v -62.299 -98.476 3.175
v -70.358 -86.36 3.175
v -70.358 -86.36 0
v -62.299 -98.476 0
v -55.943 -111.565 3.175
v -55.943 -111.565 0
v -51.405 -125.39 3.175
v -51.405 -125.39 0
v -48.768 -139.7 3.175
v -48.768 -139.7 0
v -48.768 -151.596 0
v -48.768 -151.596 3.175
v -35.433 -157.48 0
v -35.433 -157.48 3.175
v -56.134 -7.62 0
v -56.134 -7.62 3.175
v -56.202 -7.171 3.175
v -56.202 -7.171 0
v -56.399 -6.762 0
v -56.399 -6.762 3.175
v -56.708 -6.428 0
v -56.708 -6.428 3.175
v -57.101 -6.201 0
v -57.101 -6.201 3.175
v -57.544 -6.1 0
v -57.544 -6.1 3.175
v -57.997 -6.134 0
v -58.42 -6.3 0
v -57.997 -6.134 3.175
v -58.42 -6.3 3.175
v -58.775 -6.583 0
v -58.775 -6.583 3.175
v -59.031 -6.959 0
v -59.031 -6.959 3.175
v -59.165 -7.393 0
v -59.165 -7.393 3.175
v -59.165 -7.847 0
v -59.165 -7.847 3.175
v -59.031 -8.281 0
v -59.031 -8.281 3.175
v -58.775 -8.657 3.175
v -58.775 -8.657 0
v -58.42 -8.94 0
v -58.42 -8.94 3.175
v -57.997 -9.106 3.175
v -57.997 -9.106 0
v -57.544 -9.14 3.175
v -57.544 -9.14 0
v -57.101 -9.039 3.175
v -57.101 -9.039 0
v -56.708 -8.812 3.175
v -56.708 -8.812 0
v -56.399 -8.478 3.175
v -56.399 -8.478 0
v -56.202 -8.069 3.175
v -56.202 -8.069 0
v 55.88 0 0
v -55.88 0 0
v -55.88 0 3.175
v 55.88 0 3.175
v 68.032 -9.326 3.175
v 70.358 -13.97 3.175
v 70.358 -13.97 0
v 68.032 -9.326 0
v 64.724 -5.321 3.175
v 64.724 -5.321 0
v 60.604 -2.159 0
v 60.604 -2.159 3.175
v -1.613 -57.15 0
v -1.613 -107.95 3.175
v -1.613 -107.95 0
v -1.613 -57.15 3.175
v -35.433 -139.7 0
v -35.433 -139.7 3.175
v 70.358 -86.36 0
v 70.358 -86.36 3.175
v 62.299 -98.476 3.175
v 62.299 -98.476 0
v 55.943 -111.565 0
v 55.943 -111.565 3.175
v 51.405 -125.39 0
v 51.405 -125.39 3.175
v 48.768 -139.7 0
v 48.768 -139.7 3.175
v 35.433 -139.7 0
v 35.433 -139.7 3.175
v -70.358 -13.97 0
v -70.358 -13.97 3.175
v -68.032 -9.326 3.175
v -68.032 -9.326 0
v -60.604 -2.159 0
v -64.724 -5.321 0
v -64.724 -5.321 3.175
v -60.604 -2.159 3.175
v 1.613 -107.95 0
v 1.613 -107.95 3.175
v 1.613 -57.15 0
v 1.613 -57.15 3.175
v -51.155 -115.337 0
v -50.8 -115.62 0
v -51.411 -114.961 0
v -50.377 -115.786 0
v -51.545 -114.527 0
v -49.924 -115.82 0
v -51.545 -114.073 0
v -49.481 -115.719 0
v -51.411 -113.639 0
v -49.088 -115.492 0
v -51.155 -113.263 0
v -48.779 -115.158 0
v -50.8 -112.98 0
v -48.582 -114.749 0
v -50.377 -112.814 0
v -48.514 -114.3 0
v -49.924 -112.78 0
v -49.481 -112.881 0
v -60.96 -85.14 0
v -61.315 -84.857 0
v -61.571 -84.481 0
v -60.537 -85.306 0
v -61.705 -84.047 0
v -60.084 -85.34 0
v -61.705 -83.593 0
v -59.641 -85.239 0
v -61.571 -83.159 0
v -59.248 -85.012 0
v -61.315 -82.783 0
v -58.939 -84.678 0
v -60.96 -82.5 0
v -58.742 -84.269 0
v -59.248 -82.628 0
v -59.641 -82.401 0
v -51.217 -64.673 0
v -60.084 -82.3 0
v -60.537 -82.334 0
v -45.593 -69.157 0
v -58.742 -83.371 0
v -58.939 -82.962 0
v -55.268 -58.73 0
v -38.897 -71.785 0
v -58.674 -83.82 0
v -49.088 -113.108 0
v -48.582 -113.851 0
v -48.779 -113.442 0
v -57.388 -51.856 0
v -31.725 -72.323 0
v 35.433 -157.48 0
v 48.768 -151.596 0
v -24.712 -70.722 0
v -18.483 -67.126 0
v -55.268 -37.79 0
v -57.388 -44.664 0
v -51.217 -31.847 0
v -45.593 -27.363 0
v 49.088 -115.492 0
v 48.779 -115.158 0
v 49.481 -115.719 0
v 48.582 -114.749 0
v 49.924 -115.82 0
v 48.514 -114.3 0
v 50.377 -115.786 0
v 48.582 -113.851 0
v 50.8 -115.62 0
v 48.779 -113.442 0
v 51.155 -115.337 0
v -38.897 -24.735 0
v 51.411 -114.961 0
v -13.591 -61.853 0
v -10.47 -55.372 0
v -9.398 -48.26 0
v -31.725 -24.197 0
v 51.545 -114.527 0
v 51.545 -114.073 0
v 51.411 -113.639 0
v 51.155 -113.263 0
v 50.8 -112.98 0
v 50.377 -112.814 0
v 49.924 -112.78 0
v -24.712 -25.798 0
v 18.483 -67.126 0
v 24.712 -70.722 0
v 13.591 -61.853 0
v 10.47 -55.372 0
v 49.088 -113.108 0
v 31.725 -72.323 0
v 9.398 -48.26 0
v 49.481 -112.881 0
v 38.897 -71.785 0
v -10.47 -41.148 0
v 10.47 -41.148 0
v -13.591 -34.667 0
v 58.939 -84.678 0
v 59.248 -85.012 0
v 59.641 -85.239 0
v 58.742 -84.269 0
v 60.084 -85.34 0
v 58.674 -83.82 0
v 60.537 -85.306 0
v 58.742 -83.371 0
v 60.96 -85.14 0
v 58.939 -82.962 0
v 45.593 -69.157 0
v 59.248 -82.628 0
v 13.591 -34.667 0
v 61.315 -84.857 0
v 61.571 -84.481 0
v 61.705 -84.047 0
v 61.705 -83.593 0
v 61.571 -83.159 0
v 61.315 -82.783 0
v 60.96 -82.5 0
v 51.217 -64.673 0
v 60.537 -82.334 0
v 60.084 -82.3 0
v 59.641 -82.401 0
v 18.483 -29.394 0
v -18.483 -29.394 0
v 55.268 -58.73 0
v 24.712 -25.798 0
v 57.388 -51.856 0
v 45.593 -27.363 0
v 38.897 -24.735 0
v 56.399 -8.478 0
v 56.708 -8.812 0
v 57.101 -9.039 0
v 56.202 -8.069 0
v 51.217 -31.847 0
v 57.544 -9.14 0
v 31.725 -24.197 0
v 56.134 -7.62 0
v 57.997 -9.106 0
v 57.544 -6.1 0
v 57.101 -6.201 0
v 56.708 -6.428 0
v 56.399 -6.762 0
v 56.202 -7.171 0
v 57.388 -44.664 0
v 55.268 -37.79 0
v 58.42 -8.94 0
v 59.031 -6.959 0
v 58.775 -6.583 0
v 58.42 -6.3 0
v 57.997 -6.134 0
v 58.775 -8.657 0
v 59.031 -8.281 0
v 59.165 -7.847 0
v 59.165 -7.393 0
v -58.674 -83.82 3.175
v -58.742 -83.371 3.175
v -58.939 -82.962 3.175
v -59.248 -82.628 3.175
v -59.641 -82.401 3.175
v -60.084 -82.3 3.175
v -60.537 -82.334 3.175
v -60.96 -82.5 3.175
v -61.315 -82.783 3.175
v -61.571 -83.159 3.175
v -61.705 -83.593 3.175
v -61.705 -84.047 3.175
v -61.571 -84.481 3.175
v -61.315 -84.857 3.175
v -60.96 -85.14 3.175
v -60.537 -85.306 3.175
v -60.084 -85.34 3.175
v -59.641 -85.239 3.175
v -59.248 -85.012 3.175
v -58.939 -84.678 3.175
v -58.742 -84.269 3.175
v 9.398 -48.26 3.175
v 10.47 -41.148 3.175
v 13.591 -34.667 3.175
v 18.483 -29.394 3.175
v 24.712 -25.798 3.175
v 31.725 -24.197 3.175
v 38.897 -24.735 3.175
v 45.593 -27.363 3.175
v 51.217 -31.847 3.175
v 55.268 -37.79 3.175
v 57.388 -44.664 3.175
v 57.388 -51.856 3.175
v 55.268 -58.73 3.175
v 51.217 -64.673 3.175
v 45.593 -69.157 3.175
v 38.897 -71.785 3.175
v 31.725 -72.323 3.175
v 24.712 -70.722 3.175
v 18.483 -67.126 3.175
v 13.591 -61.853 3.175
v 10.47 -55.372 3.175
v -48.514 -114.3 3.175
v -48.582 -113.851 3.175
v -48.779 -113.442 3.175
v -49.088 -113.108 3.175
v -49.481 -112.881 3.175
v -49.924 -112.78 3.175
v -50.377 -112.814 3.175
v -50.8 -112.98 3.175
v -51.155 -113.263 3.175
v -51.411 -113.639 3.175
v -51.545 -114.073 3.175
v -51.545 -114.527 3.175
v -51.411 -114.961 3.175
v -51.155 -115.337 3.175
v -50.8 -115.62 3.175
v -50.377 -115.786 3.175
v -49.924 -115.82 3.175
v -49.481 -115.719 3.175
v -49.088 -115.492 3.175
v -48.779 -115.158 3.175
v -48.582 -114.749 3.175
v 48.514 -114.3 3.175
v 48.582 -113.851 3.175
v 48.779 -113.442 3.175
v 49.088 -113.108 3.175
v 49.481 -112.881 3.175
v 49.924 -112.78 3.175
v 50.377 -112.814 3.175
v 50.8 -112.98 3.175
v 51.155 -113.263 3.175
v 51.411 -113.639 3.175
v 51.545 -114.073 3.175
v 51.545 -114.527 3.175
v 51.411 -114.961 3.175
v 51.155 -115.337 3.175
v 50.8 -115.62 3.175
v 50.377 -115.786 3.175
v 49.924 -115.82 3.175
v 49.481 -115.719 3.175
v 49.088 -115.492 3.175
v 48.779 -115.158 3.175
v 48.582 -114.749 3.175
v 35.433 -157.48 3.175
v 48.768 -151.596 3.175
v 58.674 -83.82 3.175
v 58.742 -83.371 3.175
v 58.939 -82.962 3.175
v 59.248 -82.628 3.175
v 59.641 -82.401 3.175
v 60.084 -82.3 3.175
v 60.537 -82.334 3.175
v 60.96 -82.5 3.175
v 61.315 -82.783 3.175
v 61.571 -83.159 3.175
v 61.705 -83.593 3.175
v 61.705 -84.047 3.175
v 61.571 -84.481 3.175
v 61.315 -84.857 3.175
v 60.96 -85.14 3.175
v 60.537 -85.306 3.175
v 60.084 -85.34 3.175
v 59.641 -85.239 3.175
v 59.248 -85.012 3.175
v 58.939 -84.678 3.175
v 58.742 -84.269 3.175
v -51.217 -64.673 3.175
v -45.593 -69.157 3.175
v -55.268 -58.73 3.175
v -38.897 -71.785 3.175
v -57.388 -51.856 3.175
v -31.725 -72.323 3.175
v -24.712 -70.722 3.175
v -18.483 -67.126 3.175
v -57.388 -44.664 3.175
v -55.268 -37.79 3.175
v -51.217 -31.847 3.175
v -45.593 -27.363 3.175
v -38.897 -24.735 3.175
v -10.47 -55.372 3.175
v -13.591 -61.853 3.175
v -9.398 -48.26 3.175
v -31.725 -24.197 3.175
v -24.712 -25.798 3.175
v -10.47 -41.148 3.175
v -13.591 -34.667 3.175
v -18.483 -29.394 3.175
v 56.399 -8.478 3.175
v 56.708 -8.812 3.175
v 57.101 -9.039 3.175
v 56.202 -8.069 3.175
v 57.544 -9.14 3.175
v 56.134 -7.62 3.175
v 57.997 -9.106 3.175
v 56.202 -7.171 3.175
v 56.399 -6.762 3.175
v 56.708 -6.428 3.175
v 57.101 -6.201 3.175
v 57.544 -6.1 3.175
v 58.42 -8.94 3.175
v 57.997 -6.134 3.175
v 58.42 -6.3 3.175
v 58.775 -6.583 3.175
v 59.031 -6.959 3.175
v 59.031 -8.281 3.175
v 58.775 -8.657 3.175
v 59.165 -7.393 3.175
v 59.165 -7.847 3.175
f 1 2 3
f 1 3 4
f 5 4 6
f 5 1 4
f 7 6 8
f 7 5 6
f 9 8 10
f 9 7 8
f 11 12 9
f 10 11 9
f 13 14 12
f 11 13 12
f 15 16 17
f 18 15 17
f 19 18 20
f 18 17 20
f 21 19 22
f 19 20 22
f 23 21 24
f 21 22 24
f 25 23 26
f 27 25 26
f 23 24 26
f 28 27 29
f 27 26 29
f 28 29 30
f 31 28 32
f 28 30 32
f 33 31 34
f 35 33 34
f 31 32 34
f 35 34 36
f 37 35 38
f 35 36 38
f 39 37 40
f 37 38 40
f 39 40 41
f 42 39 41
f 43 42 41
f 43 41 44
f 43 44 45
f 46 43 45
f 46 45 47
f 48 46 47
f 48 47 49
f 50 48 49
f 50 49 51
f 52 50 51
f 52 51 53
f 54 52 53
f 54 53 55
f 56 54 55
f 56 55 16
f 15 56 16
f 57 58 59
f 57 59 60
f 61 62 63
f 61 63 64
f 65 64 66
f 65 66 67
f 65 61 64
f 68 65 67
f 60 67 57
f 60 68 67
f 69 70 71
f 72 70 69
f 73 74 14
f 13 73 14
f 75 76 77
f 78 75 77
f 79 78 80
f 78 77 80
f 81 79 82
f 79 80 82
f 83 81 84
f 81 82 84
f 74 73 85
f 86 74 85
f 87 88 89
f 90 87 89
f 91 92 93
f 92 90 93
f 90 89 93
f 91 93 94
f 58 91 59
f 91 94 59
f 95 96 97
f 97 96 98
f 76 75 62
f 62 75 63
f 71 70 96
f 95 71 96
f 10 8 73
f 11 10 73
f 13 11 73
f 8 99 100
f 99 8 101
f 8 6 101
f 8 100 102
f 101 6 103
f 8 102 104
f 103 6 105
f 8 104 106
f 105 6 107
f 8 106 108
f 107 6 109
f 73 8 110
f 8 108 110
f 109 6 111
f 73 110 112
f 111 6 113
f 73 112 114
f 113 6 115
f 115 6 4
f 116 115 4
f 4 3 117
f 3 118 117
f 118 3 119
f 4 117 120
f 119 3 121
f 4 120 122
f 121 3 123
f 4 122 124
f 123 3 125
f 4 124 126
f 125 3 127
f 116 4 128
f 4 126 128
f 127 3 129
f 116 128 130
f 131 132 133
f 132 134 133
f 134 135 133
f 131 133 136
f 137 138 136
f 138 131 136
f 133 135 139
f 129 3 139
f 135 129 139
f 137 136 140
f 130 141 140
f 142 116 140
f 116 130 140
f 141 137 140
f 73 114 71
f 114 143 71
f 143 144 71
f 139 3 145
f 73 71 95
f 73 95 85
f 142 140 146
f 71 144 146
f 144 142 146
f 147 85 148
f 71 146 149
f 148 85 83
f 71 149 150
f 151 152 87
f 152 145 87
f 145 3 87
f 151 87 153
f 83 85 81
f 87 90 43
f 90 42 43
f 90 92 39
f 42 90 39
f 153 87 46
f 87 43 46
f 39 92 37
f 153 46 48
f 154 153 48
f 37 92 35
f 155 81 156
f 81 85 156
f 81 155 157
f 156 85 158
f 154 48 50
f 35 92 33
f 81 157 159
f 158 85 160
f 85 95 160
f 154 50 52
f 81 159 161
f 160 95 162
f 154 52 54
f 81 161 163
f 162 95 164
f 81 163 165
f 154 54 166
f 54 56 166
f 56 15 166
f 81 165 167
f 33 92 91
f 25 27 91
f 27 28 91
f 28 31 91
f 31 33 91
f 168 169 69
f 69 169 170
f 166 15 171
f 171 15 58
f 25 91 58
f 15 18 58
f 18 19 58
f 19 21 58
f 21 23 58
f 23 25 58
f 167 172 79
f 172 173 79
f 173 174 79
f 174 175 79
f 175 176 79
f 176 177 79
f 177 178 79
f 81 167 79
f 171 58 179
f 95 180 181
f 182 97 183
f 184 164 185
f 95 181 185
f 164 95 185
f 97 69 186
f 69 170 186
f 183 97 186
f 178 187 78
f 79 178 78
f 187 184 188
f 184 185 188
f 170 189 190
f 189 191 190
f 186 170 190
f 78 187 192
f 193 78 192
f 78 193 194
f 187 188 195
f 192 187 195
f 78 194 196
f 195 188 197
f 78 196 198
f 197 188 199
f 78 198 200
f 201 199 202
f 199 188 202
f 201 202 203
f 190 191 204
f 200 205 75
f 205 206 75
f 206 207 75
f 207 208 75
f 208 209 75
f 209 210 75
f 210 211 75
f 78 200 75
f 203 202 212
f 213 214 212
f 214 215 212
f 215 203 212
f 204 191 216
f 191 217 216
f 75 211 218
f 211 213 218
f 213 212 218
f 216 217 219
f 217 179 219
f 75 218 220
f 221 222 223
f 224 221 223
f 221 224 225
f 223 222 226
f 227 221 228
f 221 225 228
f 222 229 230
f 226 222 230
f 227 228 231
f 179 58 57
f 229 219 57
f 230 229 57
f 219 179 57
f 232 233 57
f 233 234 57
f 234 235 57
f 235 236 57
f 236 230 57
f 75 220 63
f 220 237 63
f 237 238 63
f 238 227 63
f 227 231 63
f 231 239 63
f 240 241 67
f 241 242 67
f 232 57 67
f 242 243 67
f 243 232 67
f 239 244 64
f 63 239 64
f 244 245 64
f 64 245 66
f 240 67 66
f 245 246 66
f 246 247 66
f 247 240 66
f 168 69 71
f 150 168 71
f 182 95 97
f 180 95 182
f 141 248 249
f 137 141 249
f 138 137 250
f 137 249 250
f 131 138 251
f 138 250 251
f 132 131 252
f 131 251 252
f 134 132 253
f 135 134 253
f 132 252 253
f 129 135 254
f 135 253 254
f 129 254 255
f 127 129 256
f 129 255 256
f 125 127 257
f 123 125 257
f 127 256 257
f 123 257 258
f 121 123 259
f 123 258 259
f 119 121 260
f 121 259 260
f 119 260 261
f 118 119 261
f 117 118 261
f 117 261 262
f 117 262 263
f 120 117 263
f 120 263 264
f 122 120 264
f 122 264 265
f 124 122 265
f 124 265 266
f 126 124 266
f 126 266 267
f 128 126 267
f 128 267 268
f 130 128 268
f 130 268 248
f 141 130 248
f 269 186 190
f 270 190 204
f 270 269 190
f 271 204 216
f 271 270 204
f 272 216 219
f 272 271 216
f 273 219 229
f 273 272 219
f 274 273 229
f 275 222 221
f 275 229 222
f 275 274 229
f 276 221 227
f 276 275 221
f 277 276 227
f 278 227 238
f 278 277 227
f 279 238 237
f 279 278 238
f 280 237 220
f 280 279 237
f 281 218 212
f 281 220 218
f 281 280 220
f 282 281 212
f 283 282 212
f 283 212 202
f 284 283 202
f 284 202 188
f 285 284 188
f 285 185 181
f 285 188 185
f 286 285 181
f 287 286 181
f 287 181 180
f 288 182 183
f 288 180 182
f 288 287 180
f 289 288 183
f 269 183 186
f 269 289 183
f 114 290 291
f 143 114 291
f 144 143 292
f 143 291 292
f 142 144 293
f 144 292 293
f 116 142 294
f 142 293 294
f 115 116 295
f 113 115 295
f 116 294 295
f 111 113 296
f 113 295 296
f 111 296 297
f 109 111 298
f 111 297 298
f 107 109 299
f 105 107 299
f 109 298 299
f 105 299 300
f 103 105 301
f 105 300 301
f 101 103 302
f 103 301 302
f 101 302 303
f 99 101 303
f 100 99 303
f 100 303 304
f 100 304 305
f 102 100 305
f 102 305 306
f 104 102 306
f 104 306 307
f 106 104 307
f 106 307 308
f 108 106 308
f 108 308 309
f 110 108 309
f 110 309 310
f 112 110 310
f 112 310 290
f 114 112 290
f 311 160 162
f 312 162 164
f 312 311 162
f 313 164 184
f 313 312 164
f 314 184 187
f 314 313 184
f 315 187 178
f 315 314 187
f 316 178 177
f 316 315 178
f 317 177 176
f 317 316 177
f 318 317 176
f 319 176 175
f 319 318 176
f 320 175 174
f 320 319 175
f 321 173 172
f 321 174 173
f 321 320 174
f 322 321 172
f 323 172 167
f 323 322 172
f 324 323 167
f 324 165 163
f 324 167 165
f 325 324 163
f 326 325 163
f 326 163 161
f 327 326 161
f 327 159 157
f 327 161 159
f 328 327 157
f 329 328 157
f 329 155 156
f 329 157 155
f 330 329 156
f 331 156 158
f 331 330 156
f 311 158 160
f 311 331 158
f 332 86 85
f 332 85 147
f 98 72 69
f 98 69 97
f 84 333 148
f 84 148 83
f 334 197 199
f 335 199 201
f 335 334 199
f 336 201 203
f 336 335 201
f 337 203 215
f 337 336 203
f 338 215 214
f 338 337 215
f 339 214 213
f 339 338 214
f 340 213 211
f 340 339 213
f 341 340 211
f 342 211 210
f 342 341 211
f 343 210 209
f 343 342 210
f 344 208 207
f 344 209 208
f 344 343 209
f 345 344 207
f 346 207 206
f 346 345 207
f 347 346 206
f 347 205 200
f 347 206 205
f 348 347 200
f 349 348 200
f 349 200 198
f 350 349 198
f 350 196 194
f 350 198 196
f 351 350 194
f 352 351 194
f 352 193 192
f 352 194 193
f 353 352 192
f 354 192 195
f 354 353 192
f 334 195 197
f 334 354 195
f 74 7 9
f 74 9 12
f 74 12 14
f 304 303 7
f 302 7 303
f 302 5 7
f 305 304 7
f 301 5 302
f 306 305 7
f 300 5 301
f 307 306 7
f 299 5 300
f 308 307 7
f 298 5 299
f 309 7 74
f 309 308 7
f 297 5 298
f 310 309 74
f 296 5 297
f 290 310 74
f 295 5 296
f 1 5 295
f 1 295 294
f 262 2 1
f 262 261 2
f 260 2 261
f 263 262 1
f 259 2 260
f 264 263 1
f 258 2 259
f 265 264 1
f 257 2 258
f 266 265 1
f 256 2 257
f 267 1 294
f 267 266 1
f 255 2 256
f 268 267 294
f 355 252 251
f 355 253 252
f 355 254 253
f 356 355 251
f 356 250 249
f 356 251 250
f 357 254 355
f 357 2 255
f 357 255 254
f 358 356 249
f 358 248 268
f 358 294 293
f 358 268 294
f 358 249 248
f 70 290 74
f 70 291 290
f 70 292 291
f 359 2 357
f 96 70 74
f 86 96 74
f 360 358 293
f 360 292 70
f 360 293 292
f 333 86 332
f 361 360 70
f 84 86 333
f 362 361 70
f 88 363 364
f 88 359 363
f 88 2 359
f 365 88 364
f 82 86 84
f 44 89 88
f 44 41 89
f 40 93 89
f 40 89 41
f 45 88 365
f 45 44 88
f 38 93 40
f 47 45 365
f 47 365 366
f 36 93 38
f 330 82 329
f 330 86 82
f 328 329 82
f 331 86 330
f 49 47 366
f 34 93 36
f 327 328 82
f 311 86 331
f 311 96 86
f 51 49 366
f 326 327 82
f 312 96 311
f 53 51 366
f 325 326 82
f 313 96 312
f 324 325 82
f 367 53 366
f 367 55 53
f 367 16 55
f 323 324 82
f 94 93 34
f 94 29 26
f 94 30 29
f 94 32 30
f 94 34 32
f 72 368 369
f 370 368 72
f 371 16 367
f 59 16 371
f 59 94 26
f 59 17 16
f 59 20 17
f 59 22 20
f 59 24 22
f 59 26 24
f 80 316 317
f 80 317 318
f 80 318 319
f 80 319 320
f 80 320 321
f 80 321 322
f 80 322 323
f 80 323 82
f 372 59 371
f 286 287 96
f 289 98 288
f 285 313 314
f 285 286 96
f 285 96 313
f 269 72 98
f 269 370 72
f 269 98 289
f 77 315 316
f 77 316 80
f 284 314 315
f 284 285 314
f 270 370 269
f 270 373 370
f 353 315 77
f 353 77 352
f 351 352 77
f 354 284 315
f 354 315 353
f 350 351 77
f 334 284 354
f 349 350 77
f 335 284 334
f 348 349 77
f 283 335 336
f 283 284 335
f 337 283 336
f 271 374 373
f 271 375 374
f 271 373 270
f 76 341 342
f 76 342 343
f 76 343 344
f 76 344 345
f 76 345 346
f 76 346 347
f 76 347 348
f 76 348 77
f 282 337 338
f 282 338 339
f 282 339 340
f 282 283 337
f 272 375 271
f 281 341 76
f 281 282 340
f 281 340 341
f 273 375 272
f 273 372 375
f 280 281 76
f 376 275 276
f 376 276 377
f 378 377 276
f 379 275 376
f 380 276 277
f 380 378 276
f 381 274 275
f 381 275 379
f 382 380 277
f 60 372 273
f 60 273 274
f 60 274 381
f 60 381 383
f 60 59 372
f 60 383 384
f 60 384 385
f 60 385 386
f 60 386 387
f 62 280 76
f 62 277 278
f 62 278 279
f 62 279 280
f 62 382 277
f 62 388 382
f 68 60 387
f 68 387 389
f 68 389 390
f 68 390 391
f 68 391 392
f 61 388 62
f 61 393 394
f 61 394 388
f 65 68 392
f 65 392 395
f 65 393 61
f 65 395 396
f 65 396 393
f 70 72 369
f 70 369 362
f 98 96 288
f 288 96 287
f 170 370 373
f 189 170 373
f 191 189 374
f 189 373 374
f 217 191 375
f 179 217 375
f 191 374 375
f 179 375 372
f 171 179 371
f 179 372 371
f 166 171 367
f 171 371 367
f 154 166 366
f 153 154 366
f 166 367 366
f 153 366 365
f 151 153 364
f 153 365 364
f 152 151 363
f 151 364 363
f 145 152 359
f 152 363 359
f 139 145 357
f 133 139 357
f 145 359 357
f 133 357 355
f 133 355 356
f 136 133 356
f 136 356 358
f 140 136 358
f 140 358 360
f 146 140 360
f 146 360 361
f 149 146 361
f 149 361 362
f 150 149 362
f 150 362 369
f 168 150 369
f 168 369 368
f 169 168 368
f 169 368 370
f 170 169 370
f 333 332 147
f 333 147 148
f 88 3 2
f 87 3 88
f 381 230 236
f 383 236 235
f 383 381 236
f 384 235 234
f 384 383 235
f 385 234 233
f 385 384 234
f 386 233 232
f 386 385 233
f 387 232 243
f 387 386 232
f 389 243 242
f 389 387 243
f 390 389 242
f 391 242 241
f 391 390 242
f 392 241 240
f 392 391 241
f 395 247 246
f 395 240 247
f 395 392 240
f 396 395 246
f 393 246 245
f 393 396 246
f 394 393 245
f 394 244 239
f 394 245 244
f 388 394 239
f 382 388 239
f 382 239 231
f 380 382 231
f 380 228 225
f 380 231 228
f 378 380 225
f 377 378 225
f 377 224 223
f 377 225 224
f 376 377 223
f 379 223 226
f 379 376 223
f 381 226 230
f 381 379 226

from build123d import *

# Parameters (mm, degrees)
SKETCH1_W                           = 140.716
SKETCH1_H                           = 139.7
MAIN_BODY_DEPTH                     = 3.175
SKETCH2_R                           = 24.13
CUTS_FOR_EYES_AND_MOTORS_DEPTH      = 4.175
SKETCH4_W                           = 3.2258
SKETCH4_H                           = 50.8
CUT_FOR_NOSE_DEPTH                  = 4.175
CUT_FOR_ROUNDED_FACE_FEATURES_DEPTH = 4.175
SKETCH12_R                          = 1.524
HOLES_FOR_SPACERS_DEPTH             = 4.175
BOSS_EXTRUDE1_DEPTH                 = 3.175


with BuildPart() as part:
    # Sketch1 → main body (new body)
    with BuildSketch(Plane.XY):
        with Locations((0, -69.85)):
            Rectangle(SKETCH1_W, SKETCH1_H)
    extrude(amount=MAIN_BODY_DEPTH)

    # Sketch2 → cuts for eyes and motors (cut, through all)
    with BuildSketch(Plane.XY.offset(3.175)):
        with Locations((-33.528, -48.26)):
            Circle(SKETCH2_R)
    cuts_for_eyes_and_motors = extrude(amount=-CUTS_FOR_EYES_AND_MOTORS_DEPTH, mode=Mode.SUBTRACT)

    # Sketch4 → cut for nose (cut, through all)
    with BuildSketch(Plane.XY.offset(3.175)):
        with Locations((0, -82.55)):
            Rectangle(SKETCH4_W, SKETCH4_H)
    extrude(amount=-CUT_FOR_NOSE_DEPTH, mode=Mode.SUBTRACT)

    # Mirror1: cuts for eyes and motors across plane
    add(cuts_for_eyes_and_motors.mirror(Plane(origin=(0, 0, 0), x_dir=(0, 0, 1), z_dir=(1, 0, 0))), mode=Mode.SUBTRACT)

    # Sketch11 → cut for rounded face features (cut, through all)
    with BuildSketch(Plane.XY.offset(3.175)):
        with BuildLine():
            Line((-70.358, -139.7), (-70.358, -86.36))
            ThreePointArc((-70.358, -86.36), (-55.943359781, -111.56490753), (-48.768, -139.7))
            Line((-48.768, -139.7), (-70.358, -139.7))
        make_face()
        with BuildLine():
            Line((-70.358, 0), (-70.358, -13.97))
            ThreePointArc((-70.358, -13.97), (-64.724440046, -5.321180316), (-55.88, 0))
            Line((-55.88, 0), (-70.358, 0))
        make_face()
    cut_for_rounded_face_features = extrude(amount=-CUT_FOR_ROUNDED_FACE_FEATURES_DEPTH, mode=Mode.SUBTRACT)

    # mirror of rounded feature: cut for rounded face features across plane
    add(cut_for_rounded_face_features.mirror(Plane(origin=(0, 0, 0), x_dir=(0, 0, 1), z_dir=(1, 0, 0))), mode=Mode.SUBTRACT)

    # Sketch12 → holes for spacers (cut, through all)
    with BuildSketch(Plane.XY.offset(3.175)):
        with Locations((-57.658, -7.62)):
            Circle(SKETCH12_R)
        with Locations((-60.198, -83.82)):
            Circle(SKETCH12_R)
        with Locations((-50.038, -114.3)):
            Circle(SKETCH12_R)
    holes_for_spacers = extrude(amount=-HOLES_FOR_SPACERS_DEPTH, mode=Mode.SUBTRACT)

    # mirror of spacer hole: holes for spacers across plane
    add(holes_for_spacers.mirror(Plane(origin=(0, 0, 0), x_dir=(0, 0, 1), z_dir=(1, 0, 0))), mode=Mode.SUBTRACT)

    # Sketch14 → Boss-Extrude1 (add)
    with BuildSketch(Plane.XY.offset(3.175)):
        Polygon((-48.768, -139.7), (-35.433, -139.7), (-35.433, -157.48), (-48.768, -151.596070028), align=None)
    boss_extrude1 = extrude(amount=-BOSS_EXTRUDE1_DEPTH)

    # Mirror3: Boss-Extrude1 across plane
    add(boss_extrude1.mirror(Plane(origin=(0, 0, 0), x_dir=(0, 0, 1), z_dir=(1, 0, 0))))


solid = part.part
